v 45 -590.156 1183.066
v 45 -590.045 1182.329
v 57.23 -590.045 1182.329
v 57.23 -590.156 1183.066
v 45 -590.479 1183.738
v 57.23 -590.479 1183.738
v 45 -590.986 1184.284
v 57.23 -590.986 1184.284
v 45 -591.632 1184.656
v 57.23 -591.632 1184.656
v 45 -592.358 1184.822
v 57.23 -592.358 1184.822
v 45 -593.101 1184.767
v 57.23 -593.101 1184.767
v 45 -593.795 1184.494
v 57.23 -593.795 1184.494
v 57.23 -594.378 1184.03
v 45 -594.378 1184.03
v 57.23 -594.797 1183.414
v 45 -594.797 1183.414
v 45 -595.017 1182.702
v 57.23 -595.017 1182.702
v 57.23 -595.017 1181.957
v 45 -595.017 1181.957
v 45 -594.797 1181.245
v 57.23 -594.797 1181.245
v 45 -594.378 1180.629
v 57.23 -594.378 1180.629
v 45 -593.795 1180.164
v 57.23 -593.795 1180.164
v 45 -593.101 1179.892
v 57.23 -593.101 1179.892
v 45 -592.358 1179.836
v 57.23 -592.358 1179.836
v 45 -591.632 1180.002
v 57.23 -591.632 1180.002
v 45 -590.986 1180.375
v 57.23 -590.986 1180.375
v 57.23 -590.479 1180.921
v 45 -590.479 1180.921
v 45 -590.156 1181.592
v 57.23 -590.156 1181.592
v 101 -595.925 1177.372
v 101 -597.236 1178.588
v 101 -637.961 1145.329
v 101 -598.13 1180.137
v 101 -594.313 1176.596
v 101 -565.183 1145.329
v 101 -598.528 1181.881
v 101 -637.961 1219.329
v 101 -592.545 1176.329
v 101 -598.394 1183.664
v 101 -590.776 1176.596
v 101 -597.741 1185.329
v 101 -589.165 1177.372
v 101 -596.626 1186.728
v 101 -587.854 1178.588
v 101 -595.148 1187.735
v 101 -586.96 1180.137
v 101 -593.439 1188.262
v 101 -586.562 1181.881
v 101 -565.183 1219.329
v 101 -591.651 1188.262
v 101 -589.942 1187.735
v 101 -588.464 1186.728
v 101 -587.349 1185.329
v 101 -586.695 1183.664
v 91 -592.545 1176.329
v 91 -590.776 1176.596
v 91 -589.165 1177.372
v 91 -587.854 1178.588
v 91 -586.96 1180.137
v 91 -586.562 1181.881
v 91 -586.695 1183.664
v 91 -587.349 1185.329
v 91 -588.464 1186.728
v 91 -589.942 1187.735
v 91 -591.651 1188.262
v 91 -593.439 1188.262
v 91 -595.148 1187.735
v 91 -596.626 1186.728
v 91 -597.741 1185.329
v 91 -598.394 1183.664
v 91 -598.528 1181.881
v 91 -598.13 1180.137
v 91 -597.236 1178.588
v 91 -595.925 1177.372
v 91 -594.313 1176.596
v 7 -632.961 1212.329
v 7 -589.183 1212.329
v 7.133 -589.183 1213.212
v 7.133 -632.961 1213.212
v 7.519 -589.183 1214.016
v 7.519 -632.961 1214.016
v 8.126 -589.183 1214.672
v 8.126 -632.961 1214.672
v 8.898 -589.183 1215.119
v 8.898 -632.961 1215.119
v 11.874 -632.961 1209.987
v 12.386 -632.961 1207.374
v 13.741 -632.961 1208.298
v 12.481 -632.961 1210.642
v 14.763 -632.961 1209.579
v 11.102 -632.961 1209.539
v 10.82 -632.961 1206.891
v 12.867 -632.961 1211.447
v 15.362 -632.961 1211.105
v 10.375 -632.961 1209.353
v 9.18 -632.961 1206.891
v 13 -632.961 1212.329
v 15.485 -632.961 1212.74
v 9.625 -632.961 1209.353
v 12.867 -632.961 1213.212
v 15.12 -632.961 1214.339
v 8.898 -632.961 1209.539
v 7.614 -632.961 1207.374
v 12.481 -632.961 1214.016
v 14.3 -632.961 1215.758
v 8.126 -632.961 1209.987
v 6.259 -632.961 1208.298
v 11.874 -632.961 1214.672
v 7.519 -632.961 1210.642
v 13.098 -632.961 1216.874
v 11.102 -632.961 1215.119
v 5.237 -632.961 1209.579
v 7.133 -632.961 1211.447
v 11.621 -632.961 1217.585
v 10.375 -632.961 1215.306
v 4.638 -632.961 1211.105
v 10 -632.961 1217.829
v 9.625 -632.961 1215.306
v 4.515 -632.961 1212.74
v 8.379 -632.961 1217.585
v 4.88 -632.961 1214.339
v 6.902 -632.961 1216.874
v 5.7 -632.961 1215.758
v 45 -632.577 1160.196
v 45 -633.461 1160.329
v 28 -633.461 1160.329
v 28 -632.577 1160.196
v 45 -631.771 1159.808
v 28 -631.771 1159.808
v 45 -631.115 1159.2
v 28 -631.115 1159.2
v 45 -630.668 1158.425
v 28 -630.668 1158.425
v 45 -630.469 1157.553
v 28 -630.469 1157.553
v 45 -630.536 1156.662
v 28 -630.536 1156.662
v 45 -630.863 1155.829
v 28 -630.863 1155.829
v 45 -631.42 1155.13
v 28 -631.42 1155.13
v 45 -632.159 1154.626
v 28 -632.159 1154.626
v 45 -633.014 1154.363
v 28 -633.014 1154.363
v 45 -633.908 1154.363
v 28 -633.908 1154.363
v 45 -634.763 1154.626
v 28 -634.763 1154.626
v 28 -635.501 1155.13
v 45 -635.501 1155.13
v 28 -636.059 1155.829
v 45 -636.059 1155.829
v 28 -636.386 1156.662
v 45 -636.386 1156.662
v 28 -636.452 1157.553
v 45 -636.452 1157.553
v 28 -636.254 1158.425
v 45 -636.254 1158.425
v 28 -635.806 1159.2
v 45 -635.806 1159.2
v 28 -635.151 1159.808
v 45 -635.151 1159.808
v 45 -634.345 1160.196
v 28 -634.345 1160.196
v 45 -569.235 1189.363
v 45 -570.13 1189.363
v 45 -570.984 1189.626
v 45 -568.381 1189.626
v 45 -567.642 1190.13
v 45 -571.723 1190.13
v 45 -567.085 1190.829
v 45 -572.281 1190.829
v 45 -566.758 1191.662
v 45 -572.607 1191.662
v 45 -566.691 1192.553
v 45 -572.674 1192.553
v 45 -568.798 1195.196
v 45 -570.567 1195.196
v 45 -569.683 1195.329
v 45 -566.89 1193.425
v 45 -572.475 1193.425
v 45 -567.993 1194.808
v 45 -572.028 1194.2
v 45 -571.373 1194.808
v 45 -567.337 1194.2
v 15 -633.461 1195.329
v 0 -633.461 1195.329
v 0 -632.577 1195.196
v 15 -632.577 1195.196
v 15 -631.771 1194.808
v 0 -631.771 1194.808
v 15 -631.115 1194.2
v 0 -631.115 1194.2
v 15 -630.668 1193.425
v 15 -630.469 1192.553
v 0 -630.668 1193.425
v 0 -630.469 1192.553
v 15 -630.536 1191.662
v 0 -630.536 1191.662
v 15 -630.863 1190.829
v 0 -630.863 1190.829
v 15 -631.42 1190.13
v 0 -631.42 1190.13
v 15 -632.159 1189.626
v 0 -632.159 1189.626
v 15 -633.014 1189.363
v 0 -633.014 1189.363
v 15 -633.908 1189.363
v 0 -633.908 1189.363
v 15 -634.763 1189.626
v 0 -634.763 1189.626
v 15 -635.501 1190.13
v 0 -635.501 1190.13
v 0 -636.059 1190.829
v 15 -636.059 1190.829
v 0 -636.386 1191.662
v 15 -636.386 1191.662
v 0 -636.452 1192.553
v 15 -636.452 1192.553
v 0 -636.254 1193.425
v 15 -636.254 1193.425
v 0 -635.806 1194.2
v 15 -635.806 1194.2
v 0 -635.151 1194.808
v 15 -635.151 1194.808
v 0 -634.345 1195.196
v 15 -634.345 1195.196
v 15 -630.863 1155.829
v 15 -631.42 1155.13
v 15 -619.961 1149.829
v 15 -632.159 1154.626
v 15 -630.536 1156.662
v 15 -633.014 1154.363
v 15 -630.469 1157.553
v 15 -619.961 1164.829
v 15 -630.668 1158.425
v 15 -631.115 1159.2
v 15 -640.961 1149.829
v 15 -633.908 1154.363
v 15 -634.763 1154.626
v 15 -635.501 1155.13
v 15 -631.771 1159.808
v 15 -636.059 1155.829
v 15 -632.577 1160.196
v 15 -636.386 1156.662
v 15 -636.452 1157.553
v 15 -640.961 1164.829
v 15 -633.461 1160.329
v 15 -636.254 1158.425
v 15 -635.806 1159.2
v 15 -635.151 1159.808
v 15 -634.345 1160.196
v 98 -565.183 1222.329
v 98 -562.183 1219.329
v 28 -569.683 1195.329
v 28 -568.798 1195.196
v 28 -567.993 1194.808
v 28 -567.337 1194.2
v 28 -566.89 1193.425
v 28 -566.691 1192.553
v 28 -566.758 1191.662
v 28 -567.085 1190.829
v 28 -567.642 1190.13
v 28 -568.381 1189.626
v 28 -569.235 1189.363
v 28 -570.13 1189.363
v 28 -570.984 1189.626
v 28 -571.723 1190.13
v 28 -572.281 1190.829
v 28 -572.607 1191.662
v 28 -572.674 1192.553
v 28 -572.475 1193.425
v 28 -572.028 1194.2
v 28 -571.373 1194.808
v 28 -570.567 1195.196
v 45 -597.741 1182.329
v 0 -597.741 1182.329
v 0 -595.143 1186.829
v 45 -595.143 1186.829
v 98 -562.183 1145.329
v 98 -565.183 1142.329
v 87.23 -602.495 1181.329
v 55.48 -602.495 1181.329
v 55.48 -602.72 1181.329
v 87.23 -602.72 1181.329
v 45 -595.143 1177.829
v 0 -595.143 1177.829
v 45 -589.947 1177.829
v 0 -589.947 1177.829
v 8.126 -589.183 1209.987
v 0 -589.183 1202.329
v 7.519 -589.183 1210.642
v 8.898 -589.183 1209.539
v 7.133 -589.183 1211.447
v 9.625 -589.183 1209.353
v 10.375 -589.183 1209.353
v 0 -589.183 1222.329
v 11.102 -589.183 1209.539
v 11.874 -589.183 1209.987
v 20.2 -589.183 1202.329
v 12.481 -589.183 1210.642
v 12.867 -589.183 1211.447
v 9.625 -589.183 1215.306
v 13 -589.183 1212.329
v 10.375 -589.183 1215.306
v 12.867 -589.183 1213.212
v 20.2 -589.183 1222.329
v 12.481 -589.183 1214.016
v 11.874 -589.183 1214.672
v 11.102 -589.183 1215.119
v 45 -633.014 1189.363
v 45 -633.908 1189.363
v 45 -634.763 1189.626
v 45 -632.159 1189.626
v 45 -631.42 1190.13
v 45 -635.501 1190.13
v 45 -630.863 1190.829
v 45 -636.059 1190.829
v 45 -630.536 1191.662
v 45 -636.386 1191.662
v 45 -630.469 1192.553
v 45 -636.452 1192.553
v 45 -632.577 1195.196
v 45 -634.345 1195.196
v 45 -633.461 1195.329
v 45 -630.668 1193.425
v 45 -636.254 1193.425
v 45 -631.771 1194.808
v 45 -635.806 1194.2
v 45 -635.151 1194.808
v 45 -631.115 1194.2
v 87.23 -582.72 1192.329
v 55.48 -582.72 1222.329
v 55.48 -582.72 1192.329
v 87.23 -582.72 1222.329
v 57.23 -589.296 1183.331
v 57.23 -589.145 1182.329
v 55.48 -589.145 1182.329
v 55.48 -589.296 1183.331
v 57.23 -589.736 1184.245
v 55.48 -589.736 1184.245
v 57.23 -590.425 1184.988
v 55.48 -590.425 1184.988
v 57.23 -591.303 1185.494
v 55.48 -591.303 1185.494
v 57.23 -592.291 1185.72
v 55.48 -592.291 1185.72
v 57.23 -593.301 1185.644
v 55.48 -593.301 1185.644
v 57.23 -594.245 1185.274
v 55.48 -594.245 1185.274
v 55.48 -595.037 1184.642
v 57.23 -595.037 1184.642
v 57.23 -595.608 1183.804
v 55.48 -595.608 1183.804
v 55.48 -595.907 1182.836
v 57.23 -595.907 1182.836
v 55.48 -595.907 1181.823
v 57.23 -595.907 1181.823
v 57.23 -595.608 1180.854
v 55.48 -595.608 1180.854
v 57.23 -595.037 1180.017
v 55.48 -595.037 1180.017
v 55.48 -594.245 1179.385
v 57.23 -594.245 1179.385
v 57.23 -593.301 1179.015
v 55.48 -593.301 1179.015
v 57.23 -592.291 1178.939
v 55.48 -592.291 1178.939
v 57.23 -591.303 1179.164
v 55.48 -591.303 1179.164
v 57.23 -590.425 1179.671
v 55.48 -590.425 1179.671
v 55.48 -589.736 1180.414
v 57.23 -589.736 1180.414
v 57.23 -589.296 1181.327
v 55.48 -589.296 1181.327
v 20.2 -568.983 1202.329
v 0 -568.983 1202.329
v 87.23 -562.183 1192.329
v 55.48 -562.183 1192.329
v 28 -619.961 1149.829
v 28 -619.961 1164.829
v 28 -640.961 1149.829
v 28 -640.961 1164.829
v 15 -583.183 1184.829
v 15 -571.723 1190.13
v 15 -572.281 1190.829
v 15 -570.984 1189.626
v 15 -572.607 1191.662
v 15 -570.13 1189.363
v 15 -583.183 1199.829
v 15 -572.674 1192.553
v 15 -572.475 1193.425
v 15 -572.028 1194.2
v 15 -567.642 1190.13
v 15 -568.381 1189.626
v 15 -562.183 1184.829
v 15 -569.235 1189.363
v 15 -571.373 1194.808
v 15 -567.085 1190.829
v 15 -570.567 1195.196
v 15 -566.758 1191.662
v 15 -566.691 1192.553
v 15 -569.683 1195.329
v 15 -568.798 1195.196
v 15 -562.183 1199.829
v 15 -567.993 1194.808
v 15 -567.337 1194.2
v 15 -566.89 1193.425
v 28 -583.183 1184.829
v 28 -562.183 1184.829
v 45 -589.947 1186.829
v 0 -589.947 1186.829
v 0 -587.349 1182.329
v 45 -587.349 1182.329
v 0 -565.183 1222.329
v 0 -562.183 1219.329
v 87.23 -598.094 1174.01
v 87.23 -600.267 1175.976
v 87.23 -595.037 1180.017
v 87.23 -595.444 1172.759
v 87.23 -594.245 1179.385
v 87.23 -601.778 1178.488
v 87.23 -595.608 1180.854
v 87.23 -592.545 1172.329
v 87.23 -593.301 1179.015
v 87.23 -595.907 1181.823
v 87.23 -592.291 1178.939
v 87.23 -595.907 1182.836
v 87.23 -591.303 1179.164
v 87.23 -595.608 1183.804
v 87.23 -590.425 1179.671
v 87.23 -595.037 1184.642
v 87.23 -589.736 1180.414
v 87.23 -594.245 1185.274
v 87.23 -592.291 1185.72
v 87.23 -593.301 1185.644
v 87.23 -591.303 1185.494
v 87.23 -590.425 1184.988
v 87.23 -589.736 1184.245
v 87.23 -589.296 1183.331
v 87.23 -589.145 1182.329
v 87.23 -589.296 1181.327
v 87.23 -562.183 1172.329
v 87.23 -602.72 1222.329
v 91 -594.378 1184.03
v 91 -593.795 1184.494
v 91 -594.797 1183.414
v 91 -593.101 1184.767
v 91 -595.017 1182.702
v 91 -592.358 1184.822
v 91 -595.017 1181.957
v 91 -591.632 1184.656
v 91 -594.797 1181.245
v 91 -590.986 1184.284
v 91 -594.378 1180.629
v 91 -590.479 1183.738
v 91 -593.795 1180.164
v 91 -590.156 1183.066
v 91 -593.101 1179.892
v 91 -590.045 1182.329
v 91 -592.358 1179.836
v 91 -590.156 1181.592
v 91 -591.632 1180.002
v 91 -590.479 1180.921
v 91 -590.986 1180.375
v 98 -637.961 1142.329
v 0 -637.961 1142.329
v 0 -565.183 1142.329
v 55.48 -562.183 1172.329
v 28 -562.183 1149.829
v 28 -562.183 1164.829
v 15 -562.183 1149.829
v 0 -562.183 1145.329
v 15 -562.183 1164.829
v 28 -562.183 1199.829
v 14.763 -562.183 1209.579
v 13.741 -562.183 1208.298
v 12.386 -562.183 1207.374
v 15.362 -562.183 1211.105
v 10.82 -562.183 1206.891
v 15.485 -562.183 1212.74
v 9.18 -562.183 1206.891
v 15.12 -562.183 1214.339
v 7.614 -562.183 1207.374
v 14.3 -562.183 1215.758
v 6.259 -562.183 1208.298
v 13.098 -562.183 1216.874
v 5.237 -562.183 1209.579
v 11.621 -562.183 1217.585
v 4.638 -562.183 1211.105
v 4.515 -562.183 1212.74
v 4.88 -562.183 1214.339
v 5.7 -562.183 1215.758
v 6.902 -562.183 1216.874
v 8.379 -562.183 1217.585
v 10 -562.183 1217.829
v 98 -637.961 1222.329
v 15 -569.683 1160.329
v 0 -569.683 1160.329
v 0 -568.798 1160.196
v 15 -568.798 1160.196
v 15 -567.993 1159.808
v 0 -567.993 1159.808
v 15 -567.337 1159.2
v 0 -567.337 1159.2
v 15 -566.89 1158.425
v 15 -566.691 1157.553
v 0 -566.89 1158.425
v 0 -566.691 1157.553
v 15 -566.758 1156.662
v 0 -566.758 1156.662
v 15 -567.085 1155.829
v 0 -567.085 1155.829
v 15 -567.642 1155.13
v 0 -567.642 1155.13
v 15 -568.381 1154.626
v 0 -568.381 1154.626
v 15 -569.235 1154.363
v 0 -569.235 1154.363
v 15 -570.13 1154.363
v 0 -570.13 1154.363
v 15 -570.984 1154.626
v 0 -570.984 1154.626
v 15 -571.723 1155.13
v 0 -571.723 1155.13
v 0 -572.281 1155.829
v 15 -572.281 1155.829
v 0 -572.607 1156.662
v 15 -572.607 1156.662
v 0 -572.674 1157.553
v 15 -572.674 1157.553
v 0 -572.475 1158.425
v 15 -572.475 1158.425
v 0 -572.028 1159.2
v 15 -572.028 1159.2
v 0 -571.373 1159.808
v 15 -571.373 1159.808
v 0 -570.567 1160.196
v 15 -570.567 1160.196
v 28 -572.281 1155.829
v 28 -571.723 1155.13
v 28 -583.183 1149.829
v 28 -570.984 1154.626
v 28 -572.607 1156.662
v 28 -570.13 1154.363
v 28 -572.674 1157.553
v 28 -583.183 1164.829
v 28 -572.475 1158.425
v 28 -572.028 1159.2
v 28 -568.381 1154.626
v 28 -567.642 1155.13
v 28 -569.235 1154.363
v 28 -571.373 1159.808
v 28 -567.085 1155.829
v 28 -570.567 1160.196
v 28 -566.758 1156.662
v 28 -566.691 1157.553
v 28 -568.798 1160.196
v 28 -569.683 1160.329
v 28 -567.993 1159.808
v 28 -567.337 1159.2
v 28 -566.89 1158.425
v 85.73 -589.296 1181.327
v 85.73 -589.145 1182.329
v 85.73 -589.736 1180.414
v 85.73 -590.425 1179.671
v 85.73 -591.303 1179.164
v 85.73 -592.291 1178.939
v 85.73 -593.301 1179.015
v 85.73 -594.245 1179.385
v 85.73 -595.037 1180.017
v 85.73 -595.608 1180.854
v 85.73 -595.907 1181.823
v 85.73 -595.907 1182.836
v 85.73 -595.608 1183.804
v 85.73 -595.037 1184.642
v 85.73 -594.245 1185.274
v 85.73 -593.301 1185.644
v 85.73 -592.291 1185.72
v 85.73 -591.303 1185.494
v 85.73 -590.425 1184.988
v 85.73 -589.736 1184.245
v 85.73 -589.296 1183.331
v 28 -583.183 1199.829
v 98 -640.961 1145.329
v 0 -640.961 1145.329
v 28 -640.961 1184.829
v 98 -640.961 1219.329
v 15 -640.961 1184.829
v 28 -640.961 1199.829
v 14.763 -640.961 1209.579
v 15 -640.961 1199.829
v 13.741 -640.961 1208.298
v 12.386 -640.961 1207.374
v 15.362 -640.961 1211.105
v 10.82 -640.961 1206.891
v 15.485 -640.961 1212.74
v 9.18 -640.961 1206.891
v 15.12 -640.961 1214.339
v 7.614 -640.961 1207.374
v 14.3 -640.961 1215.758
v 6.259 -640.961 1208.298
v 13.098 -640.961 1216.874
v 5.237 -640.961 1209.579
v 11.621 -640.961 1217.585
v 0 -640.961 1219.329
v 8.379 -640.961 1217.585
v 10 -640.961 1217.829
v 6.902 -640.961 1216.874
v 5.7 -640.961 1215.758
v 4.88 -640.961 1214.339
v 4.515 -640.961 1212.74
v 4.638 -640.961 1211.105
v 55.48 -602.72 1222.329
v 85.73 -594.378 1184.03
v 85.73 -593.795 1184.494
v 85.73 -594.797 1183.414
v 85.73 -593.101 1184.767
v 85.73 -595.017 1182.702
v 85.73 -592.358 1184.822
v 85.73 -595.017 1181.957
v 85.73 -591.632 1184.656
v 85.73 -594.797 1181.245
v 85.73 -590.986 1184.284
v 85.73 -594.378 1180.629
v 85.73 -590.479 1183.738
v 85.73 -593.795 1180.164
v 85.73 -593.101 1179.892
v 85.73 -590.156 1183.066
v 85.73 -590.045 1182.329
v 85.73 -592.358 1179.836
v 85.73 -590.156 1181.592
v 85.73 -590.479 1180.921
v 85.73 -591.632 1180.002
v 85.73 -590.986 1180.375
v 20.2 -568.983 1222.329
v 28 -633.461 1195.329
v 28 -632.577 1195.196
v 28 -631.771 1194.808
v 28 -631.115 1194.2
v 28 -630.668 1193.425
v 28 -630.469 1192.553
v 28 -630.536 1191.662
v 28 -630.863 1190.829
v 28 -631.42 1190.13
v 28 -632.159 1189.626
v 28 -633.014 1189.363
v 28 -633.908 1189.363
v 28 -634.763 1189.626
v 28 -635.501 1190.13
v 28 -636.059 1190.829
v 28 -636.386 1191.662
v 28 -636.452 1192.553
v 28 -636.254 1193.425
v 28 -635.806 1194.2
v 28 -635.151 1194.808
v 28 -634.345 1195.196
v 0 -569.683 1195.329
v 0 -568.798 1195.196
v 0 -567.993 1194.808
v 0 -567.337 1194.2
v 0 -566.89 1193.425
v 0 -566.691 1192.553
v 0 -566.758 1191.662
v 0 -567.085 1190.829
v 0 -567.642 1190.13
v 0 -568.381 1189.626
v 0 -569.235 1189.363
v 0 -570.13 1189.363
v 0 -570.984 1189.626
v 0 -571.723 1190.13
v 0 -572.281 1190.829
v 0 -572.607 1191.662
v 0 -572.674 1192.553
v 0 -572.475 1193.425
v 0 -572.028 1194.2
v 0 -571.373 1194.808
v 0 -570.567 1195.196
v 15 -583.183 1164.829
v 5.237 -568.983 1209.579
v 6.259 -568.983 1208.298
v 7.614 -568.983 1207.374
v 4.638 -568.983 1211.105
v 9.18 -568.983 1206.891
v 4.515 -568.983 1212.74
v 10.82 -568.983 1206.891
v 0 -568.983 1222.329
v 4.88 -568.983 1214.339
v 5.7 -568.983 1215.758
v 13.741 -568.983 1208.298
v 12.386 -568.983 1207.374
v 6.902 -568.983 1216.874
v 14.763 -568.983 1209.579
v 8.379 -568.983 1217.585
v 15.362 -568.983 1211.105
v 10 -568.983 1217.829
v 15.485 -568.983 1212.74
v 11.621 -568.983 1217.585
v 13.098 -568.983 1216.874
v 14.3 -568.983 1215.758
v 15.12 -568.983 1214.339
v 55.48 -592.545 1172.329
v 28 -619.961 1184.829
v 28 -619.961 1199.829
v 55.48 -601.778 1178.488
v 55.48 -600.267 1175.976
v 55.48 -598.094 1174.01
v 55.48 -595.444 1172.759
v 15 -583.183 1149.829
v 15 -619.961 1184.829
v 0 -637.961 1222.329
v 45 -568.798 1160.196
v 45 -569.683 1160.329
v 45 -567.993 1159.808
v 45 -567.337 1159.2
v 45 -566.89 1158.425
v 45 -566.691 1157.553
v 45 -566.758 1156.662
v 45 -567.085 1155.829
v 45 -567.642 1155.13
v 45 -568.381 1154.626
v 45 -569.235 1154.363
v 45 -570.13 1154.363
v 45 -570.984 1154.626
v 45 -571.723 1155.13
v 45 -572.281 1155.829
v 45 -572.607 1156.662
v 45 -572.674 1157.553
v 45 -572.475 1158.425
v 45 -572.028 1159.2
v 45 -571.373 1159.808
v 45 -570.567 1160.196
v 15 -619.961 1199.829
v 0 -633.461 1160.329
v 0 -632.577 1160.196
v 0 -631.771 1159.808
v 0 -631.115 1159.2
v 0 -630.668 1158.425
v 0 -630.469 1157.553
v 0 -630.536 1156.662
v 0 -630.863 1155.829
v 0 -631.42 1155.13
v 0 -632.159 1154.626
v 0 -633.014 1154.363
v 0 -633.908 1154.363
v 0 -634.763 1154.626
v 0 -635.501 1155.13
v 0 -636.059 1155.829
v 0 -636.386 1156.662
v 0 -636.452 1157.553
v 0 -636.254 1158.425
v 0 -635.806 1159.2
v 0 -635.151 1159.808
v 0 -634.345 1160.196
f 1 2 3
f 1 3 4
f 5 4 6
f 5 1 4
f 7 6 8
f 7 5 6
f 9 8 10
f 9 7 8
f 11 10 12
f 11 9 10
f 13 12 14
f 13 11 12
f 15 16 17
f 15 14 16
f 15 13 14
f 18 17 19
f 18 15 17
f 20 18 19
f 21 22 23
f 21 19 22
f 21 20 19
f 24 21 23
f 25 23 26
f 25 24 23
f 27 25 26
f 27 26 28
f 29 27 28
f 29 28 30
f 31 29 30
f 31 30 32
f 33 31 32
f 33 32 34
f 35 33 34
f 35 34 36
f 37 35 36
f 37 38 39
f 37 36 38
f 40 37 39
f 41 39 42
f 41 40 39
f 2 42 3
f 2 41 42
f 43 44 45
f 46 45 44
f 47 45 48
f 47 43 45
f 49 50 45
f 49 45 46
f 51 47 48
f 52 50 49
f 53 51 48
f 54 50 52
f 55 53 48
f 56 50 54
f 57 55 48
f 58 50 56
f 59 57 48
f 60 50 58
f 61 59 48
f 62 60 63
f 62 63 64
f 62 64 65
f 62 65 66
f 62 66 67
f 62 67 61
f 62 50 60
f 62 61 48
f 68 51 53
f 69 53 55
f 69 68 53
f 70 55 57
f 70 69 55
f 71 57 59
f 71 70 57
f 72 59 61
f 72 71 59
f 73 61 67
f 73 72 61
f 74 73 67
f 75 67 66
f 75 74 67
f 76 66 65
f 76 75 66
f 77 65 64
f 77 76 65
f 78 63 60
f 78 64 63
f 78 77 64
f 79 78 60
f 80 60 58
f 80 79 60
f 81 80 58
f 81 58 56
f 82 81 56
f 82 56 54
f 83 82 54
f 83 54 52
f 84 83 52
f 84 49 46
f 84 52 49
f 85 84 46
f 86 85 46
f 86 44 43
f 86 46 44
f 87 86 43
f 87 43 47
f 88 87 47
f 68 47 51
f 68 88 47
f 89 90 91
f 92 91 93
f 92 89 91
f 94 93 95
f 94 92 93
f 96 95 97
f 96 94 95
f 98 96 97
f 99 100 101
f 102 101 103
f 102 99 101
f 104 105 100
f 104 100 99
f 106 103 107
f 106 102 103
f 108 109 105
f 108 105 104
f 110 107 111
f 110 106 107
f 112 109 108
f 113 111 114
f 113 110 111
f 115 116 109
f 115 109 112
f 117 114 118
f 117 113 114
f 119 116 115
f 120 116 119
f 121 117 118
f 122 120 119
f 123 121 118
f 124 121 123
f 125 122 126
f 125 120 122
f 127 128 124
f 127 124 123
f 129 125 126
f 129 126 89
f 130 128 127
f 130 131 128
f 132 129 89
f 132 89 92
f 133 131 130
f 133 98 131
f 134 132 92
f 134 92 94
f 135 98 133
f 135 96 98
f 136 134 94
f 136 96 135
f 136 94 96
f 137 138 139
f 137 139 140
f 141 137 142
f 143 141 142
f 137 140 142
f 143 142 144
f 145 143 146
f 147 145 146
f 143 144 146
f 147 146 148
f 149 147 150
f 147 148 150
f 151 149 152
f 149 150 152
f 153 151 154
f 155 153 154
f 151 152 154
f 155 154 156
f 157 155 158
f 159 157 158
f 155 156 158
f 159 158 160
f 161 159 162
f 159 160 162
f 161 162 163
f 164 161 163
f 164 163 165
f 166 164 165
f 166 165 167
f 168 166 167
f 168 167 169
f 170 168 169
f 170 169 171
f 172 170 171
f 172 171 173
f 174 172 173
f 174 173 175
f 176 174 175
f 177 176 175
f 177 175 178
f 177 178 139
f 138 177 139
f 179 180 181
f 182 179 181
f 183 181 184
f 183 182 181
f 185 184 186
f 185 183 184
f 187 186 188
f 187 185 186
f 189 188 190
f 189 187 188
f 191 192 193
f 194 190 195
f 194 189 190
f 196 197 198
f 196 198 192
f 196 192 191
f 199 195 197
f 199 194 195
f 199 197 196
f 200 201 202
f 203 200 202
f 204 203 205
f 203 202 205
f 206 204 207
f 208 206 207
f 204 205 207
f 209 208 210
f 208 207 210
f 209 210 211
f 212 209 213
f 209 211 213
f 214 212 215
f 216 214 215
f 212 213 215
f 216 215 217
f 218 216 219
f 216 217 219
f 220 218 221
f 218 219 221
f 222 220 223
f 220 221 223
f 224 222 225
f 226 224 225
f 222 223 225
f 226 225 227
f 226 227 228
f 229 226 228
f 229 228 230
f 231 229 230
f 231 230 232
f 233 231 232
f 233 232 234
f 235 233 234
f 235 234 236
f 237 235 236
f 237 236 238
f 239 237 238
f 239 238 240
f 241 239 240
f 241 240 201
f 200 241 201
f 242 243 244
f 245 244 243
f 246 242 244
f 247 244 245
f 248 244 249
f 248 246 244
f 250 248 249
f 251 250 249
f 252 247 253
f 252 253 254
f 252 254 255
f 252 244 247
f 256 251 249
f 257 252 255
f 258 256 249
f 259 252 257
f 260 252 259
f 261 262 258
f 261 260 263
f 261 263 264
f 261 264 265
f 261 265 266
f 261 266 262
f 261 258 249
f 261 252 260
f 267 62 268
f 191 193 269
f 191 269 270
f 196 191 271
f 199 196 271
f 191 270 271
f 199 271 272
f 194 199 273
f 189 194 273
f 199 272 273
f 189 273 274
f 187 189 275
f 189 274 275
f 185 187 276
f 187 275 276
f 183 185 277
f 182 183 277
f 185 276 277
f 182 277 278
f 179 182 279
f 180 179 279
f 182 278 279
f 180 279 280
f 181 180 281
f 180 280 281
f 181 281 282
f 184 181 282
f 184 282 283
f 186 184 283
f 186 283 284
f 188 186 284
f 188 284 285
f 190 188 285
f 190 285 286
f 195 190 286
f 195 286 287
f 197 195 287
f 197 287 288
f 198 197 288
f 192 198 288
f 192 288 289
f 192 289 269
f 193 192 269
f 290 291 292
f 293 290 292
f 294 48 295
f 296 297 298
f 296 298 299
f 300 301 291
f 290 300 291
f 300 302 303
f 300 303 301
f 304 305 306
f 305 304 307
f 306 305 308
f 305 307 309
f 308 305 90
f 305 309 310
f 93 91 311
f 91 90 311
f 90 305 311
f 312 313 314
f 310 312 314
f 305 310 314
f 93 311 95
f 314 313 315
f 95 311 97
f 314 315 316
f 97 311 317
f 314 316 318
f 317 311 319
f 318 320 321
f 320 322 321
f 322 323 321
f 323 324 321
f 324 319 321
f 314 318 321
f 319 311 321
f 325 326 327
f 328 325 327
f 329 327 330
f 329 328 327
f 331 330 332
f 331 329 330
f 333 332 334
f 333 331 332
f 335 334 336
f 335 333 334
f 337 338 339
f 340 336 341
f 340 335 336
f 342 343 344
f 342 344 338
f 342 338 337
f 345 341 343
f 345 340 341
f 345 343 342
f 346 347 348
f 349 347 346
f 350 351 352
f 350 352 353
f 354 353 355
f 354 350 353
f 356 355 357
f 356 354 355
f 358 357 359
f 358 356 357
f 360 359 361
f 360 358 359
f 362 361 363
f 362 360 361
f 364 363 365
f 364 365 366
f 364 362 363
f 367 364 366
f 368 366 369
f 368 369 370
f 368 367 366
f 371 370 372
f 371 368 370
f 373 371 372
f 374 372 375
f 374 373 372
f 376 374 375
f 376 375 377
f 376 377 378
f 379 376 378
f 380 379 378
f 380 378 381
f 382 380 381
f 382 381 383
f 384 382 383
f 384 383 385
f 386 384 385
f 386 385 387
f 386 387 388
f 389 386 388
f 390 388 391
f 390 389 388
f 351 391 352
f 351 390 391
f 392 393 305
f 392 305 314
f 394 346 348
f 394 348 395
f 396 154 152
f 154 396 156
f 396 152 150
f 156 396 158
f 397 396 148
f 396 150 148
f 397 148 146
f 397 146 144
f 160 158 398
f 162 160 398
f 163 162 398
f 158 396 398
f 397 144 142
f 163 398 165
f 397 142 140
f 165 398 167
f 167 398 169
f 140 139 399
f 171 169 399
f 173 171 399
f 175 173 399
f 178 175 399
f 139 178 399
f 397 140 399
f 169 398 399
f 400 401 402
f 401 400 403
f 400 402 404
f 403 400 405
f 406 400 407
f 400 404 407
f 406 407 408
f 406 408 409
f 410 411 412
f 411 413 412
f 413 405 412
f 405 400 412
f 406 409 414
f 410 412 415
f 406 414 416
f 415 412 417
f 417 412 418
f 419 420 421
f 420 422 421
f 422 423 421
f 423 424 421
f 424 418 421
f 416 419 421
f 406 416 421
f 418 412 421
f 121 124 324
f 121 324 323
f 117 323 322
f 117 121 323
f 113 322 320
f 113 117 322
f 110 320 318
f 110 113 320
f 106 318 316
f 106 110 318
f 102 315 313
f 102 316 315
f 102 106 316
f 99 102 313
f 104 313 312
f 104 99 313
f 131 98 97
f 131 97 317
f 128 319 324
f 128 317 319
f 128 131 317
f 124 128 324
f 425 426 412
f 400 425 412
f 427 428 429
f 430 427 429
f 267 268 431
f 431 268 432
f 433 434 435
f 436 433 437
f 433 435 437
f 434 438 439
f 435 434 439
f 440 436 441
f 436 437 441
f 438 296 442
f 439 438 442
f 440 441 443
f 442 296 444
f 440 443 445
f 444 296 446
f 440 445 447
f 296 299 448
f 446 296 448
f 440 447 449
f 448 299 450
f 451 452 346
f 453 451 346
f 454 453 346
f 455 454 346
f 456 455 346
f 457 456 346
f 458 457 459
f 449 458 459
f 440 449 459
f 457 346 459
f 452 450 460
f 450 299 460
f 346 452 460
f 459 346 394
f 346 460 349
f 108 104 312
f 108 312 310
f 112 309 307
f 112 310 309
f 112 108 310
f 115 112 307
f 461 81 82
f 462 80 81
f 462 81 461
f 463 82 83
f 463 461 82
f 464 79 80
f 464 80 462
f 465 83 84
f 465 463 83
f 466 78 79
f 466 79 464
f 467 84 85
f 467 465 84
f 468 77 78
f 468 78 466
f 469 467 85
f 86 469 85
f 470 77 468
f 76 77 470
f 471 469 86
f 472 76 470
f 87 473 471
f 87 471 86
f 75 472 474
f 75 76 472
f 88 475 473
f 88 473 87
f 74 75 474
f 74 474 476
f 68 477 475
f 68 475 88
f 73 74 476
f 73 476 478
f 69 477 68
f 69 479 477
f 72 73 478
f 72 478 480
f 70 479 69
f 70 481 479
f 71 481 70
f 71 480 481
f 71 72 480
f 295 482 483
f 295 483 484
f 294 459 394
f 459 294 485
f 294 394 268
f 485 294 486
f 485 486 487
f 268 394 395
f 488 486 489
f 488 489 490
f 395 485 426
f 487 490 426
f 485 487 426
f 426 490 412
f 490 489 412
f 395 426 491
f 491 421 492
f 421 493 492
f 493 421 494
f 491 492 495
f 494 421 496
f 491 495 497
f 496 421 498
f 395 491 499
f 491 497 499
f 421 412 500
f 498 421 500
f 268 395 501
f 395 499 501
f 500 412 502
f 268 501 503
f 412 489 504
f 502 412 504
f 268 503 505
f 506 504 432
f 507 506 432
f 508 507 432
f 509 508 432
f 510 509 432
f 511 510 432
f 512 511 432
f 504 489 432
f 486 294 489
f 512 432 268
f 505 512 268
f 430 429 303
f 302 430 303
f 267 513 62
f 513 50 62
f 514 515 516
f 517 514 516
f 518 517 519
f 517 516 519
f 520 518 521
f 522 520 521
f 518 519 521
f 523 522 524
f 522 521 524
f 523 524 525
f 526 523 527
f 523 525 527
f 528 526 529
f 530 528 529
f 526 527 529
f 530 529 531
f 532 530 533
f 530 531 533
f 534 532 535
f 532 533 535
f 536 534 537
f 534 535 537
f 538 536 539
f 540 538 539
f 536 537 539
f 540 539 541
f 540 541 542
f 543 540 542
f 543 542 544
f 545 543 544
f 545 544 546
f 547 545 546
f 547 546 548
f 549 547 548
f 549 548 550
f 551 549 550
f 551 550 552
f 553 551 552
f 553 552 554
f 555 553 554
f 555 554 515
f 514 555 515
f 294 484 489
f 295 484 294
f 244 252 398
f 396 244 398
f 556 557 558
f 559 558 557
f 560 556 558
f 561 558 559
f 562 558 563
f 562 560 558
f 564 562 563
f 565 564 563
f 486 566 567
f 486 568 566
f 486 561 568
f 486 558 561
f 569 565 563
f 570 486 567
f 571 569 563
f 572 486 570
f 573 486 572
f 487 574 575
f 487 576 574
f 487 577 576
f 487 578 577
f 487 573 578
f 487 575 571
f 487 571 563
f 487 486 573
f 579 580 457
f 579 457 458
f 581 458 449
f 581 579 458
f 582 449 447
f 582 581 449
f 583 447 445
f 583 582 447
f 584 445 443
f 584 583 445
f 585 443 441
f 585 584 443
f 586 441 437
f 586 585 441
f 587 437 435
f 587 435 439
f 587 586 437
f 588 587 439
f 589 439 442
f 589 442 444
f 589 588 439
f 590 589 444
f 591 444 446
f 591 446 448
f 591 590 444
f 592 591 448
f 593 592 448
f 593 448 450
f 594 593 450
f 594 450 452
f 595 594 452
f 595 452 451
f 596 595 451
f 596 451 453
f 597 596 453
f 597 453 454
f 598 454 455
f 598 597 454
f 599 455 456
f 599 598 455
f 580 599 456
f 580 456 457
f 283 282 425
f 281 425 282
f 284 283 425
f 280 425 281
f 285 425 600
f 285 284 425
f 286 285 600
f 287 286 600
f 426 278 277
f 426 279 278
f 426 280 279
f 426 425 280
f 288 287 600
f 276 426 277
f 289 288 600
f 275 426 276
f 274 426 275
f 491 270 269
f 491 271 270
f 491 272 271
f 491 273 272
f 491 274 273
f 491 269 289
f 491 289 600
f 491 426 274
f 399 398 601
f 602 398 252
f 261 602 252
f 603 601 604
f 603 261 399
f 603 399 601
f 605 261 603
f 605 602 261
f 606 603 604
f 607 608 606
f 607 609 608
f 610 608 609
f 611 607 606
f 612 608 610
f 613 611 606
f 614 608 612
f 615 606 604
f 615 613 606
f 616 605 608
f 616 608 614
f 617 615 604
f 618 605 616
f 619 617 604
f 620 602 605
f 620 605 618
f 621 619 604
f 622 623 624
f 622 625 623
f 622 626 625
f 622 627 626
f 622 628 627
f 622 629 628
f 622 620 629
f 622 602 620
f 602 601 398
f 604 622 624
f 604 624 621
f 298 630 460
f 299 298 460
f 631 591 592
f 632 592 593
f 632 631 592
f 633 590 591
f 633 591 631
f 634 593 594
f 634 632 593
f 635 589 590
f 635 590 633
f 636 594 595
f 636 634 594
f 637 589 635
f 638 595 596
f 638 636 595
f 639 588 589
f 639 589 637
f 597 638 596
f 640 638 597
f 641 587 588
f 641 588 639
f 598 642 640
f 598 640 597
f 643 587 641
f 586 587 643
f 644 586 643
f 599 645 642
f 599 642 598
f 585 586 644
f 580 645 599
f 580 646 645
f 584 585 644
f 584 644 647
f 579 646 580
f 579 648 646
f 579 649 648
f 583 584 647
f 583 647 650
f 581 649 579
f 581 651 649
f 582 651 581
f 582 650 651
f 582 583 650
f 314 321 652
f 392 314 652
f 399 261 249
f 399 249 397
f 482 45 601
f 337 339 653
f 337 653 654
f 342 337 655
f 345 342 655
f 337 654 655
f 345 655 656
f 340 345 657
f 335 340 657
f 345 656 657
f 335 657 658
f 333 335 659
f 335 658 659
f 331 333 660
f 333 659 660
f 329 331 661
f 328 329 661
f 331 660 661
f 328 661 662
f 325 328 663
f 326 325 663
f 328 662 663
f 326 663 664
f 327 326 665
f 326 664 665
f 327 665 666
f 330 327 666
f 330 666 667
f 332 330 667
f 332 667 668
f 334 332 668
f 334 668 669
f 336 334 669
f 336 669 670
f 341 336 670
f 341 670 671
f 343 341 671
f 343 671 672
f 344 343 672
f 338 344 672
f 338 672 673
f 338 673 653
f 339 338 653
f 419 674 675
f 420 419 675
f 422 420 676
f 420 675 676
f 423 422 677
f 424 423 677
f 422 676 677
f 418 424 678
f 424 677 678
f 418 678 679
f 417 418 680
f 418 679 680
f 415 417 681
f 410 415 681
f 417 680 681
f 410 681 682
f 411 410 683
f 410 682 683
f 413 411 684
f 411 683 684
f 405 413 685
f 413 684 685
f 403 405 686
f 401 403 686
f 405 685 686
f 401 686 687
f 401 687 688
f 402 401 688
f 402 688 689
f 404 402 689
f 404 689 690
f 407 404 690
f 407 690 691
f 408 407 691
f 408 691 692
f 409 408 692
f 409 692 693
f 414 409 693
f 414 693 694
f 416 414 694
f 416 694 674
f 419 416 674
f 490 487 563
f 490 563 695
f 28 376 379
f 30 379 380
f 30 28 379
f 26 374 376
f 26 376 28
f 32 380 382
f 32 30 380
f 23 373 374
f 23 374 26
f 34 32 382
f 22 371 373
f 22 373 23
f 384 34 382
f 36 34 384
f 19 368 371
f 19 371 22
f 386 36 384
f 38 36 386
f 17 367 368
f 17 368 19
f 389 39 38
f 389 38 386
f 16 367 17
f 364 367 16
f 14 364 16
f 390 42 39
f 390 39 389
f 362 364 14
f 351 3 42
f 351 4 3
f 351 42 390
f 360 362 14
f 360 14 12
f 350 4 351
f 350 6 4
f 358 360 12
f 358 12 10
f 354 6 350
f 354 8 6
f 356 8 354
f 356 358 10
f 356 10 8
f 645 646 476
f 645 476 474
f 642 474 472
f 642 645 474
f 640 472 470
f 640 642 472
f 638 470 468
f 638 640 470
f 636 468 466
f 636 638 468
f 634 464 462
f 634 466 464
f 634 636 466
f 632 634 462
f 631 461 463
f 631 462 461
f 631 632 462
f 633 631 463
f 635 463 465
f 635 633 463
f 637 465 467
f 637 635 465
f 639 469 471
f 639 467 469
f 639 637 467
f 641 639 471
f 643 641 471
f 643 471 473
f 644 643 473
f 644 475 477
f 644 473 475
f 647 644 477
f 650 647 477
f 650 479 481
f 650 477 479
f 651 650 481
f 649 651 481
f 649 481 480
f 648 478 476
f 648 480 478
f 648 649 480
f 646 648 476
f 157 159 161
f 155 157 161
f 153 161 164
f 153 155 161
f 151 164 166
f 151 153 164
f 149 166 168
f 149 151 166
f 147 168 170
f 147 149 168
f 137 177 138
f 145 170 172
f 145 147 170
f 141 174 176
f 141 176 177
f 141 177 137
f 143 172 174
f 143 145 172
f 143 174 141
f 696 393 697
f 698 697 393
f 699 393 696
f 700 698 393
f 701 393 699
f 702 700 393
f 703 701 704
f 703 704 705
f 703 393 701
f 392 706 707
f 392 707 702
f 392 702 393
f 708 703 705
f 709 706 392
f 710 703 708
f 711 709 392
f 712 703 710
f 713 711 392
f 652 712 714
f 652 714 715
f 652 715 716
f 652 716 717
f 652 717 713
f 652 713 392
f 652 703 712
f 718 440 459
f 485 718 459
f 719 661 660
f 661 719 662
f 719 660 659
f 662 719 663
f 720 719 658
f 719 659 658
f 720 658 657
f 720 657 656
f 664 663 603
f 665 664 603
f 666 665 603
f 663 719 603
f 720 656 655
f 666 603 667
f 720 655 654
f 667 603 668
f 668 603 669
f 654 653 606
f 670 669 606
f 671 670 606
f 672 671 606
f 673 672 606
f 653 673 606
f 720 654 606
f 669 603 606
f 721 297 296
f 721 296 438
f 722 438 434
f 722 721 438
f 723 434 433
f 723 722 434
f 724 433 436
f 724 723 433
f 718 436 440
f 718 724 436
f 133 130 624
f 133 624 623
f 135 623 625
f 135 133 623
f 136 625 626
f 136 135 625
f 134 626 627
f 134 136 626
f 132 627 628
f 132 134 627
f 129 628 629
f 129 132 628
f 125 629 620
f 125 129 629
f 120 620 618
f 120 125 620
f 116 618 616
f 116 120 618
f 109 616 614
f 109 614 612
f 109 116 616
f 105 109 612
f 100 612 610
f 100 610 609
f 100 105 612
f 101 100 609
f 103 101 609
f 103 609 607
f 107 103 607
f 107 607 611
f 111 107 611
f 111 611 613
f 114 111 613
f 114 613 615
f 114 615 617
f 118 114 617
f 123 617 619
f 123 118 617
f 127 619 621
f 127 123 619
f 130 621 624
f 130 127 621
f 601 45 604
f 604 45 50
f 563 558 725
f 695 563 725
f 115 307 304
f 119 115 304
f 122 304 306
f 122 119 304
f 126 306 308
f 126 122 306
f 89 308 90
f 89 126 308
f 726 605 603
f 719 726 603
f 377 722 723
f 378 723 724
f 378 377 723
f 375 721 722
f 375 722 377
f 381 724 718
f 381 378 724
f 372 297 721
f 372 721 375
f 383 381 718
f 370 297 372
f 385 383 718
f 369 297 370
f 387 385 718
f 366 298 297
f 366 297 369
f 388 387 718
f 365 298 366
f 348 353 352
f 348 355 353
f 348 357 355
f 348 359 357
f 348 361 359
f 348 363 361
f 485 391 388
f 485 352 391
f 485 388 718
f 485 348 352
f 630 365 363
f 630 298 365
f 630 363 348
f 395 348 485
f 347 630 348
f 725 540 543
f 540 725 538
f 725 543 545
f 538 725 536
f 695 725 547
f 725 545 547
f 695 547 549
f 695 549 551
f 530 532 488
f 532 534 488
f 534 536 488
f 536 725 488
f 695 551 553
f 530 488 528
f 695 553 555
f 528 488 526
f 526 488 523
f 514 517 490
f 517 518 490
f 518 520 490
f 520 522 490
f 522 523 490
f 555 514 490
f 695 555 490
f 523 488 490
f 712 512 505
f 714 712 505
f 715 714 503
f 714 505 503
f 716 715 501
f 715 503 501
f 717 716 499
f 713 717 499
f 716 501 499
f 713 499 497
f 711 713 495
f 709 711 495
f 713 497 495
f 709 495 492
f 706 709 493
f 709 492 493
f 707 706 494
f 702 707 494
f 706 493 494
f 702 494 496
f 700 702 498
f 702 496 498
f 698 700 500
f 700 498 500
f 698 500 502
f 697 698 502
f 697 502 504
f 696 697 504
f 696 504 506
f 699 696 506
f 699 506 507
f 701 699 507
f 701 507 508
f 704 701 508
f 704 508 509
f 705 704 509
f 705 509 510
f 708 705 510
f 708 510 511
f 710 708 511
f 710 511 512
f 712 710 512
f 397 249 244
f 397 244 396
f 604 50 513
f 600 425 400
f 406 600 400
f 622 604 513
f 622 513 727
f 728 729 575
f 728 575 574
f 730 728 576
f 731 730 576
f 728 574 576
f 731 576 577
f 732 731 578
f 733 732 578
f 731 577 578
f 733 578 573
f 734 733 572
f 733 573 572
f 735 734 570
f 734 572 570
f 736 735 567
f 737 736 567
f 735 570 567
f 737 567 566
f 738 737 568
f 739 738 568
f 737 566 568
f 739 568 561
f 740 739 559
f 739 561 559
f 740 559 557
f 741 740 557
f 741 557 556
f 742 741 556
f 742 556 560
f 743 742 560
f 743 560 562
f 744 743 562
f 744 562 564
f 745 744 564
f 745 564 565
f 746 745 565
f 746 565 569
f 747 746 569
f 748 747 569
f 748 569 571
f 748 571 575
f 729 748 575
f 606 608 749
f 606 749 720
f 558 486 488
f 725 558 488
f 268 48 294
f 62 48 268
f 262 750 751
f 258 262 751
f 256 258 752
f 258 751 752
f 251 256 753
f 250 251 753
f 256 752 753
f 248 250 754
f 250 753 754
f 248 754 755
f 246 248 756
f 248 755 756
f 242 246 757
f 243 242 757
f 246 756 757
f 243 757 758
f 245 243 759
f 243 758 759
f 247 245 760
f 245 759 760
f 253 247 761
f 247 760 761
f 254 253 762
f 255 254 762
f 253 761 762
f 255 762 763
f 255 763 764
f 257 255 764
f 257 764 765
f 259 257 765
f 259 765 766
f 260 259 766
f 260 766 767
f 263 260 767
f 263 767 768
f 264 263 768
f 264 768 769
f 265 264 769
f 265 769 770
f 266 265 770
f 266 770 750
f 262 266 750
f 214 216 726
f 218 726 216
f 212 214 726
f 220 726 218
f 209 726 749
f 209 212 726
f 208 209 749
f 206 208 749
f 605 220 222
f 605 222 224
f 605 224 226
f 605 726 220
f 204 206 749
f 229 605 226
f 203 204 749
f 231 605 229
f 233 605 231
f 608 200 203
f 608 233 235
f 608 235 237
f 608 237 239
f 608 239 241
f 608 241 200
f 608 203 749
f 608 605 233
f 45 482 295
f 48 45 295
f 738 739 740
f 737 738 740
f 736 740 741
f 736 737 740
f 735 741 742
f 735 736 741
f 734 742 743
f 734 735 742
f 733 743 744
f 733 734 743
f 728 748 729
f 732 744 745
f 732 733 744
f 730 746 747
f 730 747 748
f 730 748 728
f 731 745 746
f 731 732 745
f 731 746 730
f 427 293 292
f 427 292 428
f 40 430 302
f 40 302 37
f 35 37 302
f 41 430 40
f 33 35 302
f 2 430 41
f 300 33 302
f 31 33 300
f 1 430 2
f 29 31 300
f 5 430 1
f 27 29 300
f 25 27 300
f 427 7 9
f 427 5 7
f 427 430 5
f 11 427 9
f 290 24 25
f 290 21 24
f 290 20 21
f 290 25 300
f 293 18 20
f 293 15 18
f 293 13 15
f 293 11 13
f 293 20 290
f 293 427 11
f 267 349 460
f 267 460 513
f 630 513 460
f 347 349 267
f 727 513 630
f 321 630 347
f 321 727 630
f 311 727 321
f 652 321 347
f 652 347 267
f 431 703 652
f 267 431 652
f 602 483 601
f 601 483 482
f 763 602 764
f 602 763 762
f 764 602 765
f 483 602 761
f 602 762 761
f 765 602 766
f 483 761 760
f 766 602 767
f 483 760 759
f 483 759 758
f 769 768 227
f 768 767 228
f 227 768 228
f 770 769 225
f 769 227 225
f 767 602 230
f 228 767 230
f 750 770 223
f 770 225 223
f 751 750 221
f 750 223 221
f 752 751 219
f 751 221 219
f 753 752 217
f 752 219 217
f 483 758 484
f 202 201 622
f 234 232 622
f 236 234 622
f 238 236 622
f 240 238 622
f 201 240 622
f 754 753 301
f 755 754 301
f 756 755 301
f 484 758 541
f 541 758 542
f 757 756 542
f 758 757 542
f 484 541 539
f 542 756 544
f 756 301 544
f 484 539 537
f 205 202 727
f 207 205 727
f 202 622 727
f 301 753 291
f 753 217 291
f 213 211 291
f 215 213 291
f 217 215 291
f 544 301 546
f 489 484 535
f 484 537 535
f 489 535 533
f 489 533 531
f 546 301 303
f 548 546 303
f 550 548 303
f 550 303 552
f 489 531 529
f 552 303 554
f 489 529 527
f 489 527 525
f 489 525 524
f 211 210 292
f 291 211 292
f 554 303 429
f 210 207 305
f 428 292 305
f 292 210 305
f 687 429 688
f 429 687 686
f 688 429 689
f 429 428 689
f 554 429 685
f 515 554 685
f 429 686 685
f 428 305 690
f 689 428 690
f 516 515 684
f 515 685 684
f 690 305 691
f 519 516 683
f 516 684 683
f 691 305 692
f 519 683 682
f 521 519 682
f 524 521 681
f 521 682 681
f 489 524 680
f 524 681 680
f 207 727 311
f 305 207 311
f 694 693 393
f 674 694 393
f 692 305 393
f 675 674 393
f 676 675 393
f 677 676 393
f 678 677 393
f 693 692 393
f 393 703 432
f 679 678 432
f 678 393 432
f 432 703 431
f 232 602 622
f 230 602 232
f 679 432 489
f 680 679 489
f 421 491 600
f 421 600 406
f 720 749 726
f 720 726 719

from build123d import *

# Parameters (mm, degrees)
SKETCH1_W               = 78.778264774
SKETCH1_H               = 80
BOSS_EXTRUDE1_DEPTH     = 45
SKETCH2_W               = 20.2
SKETCH2_H               = 20.2
CUT_EXTRUDE1_DEPTH      = 20
CUT_EXTRUDE2_DEPTH      = 1226.691607852
CUT_EXTRUDE2_DEPTH_BACK = 1226.691607852
SKETCH4_W               = 78.778264774
SKETCH4_H               = 80
BOSS_EXTRUDE2_DEPTH     = 56
CUT_EXTRUDE3_START      = -50.519806
SKETCH5_R               = 10
CUT_EXTRUDE3_DEPTH      = 50.519818
SKETCH6_R               = 3.4
BOSS_EXTRUDE3_DEPTH     = 12
SKETCH7_R               = 10
BOSS_EXTRUDE4_DEPTH     = 5
SKETCH8_R               = 3.4
BOSS_EXTRUDE5_DEPTH     = 1.5
SKETCH9_R               = 10
BOSS_EXTRUDE6_DEPTH     = 13.769806202
SKETCH10_W              = 31.75
SKETCH10_H              = 20
CUT_EXTRUDE4_DEPTH      = 41
SKETCH13_W              = 30.362291711
SKETCH13_H              = 20
CUT_EXTRUDE5_DEPTH      = 31.75
SKETCH11_R              = 3.4
BOSS_EXTRUDE7_DEPTH     = 14
SKETCH12_R              = 3.4
BOSS_EXTRUDE8_DEPTH     = 1.5
CUT_EXTRUDE6_DEPTH      = 1382.374333236
CUT_EXTRUDE6_DEPTH_BACK = 1382.374333236
SKETCH14_R              = 2.5
CUT_EXTRUDE7_DEPTH      = 1384.878879614
CUT_EXTRUDE7_DEPTH_BACK = 10
SKETCH15_R              = 6
CUT_EXTRUDE8_DEPTH      = 45
SKETCH17_R              = 3
CUT_EXTRUDE9_DEPTH      = 45
SKETCH18_W              = 13
SKETCH18_H              = 15
CUT_EXTRUDE10_DEPTH     = 21
SKETCH19_W              = 13
SKETCH19_H              = 15
CUT_EXTRUDE11_DEPTH     = 21
CHAMFER1_SIZE           = 3
SKETCH20_R              = 5.5
CUT_EXTRUDE12_DEPTH     = 8
CUT_EXTRUDE13_START     = -8
SKETCH21_R              = 5.5
CUT_EXTRUDE13_DEPTH     = 8


with BuildPart() as part:
    # Sketch1 → Boss-Extrude1 (new body)
    with BuildSketch(Plane.YZ):
        with Locations((-601.571748543, 1182.329293832)):
            Rectangle(SKETCH1_W, SKETCH1_H)
    extrude(amount=BOSS_EXTRUDE1_DEPTH)

    # Sketch2 → Cut-Extrude1 (cut)
    with BuildSketch(Plane.XY.offset(1222.329293832)):
        with Locations((10.1, -579.082515944)):
            Rectangle(SKETCH2_W, SKETCH2_H)
    extrude(amount=-CUT_EXTRUDE1_DEPTH, mode=Mode.SUBTRACT)

    # Sketch3 → Cut-Extrude2 (cut, two sides: drawn at the far end of the back side and taken through both)
    with BuildSketch(Plane(origin=(0, -562.182616156, 0), x_dir=(-1, 0, 0), z_dir=(0, 1, 0)).offset(-CUT_EXTRUDE2_DEPTH_BACK)):
        with BuildLine():
            ThreePointArc((-11.102244776, 1215.119465234), (-13, 1212.329293832), (-11.102244776, 1209.53912243))
            Line((-11.102244776, 1209.53912243), (-11.102244776, 1215.119465234))
        make_face()
        with BuildLine():
            Line((-11.102244776, 1215.119465234), (-11.102244776, 1209.53912243))
            ThreePointArc((-11.102244776, 1209.53912243), (-10, 1209.329293832), (-8.897755224, 1209.53912243))
            Line((-8.897755224, 1209.53912243), (-8.897755224, 1215.119465234))
            ThreePointArc((-8.897755224, 1215.119465234), (-10, 1215.329293832), (-11.102244776, 1215.119465234))
        make_face()
        with BuildLine():
            Line((-8.897755224, 1215.119465234), (-8.897755224, 1209.53912243))
            ThreePointArc((-8.897755224, 1209.53912243), (-7.519401853, 1210.642097093), (-7, 1212.329293832))
            ThreePointArc((-7, 1212.329293832), (-7.519401853, 1214.016490571), (-8.897755224, 1215.119465234))
        make_face()
    extrude(amount=CUT_EXTRUDE2_DEPTH + CUT_EXTRUDE2_DEPTH_BACK, mode=Mode.SUBTRACT)

    # Sketch4 → Boss-Extrude2 (add)
    with BuildSketch(Plane.YZ.offset(45)):
        with Locations((-601.571748543, 1182.329293832)):
            Rectangle(SKETCH4_W, SKETCH4_H)
    extrude(amount=BOSS_EXTRUDE2_DEPTH)

    # Sketch5 → Cut-Extrude3 (cut)
    with BuildSketch(Plane.YZ.offset(101).offset(CUT_EXTRUDE3_START)):
        with Locations(Location((-592.544907867, 1182.329293832, 0), (0, 0, 270))):
            Circle(SKETCH5_R)
    extrude(amount=CUT_EXTRUDE3_DEPTH, mode=Mode.SUBTRACT)

    # Sketch6 → Boss-Extrude3 (add)
    with BuildSketch(Plane(origin=(57.230193798, 0, 0), x_dir=(0, -1, 0), z_dir=(-1, 0, 0))):
        with Locations(Location((592.544907867, 1182.329293832, 0), (0, 0, 180))):
            Circle(SKETCH6_R)
    extrude(amount=BOSS_EXTRUDE3_DEPTH)

    # Sketch7 → Boss-Extrude4 (add)
    with BuildSketch(Plane.YZ.offset(50.480193798)):
        with Locations(Location((-592.544907867, 1182.329293832, 0), (0, 0, 270))):
            Circle(SKETCH7_R)
    extrude(amount=BOSS_EXTRUDE4_DEPTH)



with BuildPart() as body_2:
    # Sketch8 → Boss-Extrude5 (new body)
    with BuildSketch(Plane.YZ.offset(85.730193798)):
        with Locations((-592.544907867, 1182.329293832)):
            Circle(SKETCH8_R)
    extrude(amount=BOSS_EXTRUDE5_DEPTH)


with BuildPart() as part_1:
    add(part.part)

    add(body_2.part)  # Boss-Extrude6 merges body 2
    # Sketch9 → Boss-Extrude6 (add)
    with BuildSketch(Plane.YZ.offset(87.230193798)):
        with Locations((-592.544907867, 1182.329293832)):
            Circle(SKETCH9_R)
    extrude(amount=BOSS_EXTRUDE6_DEPTH)

    # Sketch10 → Cut-Extrude4 (cut)
    with BuildSketch(Plane.XY.offset(1222.329293832)):
        with Locations((71.355193798, -592.719907867)):
            Rectangle(SKETCH10_W, SKETCH10_H)
    extrude(amount=-CUT_EXTRUDE4_DEPTH, mode=Mode.SUBTRACT)

    # Sketch13 → Cut-Extrude5 (cut)
    with BuildSketch(Plane.YZ.offset(55.480193798)):
        with Locations((-577.363762012, 1182.329293832)):
            Rectangle(SKETCH13_W, SKETCH13_H)
    extrude(amount=CUT_EXTRUDE5_DEPTH, mode=Mode.SUBTRACT)

    # Sketch11 → Boss-Extrude7 (add)
    with BuildSketch(Plane.YZ.offset(57.230193798)):
        with Locations((-592.544907867, 1182.329293832)):
            Circle(SKETCH11_R)
    extrude(amount=-BOSS_EXTRUDE7_DEPTH)

    # Sketch12 → Boss-Extrude8 (add)
    with BuildSketch(Plane(origin=(85.730193798, 0, 0), x_dir=(0, -1, 0), z_dir=(-1, 0, 0))):
        with Locations(Location((592.544907867, 1182.329293832, 0), (0, 0, 180))):
            Circle(SKETCH12_R)
    extrude(amount=-BOSS_EXTRUDE8_DEPTH)

    # Sketch14 → Cut-Extrude6 (cut, two sides: drawn at the far end of the back side and taken through both)
    with BuildSketch(Plane.YZ.offset(57.230193798).offset(-CUT_EXTRUDE6_DEPTH_BACK)):
        with Locations((-592.544907867, 1182.329293832)):
            Circle(SKETCH14_R)
    extrude(amount=CUT_EXTRUDE6_DEPTH + CUT_EXTRUDE6_DEPTH_BACK, mode=Mode.SUBTRACT)

    # Sketch15 → Cut-Extrude7 (cut, two sides: drawn at the far end of the back side and taken through both)
    with BuildSketch(Plane.YZ.offset(101).offset(-CUT_EXTRUDE7_DEPTH_BACK)):
        with Locations(Location((-592.544907867, 1182.329293832, 0), (0, 0, 270))):
            Circle(SKETCH15_R)
    extrude(amount=CUT_EXTRUDE7_DEPTH + CUT_EXTRUDE7_DEPTH_BACK, mode=Mode.SUBTRACT)

    # Sketch16 → Cut-Extrude8 (cut)
    with BuildSketch(Plane(origin=(0, 0, 0), x_dir=(0, -1, 0), z_dir=(-1, 0, 0))):
        Polygon((589.946831656, 1177.829293832), (595.142984078, 1177.829293832), (597.74106029, 1182.329293832), (595.142984078, 1186.829293832), (589.946831656, 1186.829293832), (587.348755444, 1182.329293832), align=None)
    extrude(amount=-CUT_EXTRUDE8_DEPTH, mode=Mode.SUBTRACT)

    # Sketch17 → Cut-Extrude9 (cut)
    with BuildSketch(Plane(origin=(0, 0, 0), x_dir=(0, -1, 0), z_dir=(-1, 0, 0))):
        with Locations(Location((569.682616156, 1157.329293832, 0), (0, 0, 90))):
            Circle(SKETCH17_R)
        with Locations(Location((633.46088093, 1157.329293832, 0), (0, 0, 90))):
            Circle(SKETCH17_R)
        with Locations(Location((569.682616156, 1192.329293832, 0), (0, 0, 90))):
            Circle(SKETCH17_R)
        with Locations(Location((633.46088093, 1192.329293832, 0), (0, 0, 90))):
            Circle(SKETCH17_R)
    extrude(amount=-CUT_EXTRUDE9_DEPTH, mode=Mode.SUBTRACT)

    # Sketch18 → Cut-Extrude10 (cut)
    with BuildSketch(Plane(origin=(0, -562.182616156, 0), x_dir=(-1, 0, 0), z_dir=(0, 1, 0))):
        with Locations((-21.5, 1157.329293832)):
            Rectangle(SKETCH18_W, SKETCH18_H)
        with Locations((-21.5, 1192.329293832)):
            Rectangle(SKETCH18_W, SKETCH18_H)
    extrude(amount=-CUT_EXTRUDE10_DEPTH, mode=Mode.SUBTRACT)

    # Sketch19 → Cut-Extrude11 (cut)
    with BuildSketch(Plane.XZ.offset(640.96088093)):
        with Locations((21.5, 1157.329293832)):
            Rectangle(SKETCH19_W, SKETCH19_H)
        with Locations((21.5, 1192.329293832)):
            Rectangle(SKETCH19_W, SKETCH19_H)
    extrude(amount=-CUT_EXTRUDE11_DEPTH, mode=Mode.SUBTRACT)

    # Chamfer1
    chamfer1_edges = [part_1.edges().sort_by_distance(p)[0] for p in [
        (101, -601.571748543, 1222.329293832),
        (101, -640.96088093, 1182.329293832),
        (101, -601.571748543, 1142.329293832),
        (101, -562.182616156, 1182.329293832),
        (50.5, -640.96088093, 1222.329293832),
        (50.5, -562.182616156, 1222.329293832),
        (50.5, -562.182616156, 1142.329293832),
        (50.5, -640.96088093, 1142.329293832),
    ]]
    chamfer(chamfer1_edges, length=CHAMFER1_SIZE)

    # Sketch20 → Cut-Extrude12 (cut)
    with BuildSketch(Plane(origin=(0, -562.182616156, 0), x_dir=(-1, 0, 0), z_dir=(0, 1, 0))):
        with Locations(Location((-10, 1212.329293832, 0), (0, 0, 90))):
            Circle(SKETCH20_R)
    extrude(amount=-CUT_EXTRUDE12_DEPTH, mode=Mode.SUBTRACT)

    # Sketch21 → Cut-Extrude13 (cut)
    with BuildSketch(Plane.XZ.offset(640.96088093).offset(CUT_EXTRUDE13_START)):
        with Locations(Location((10, 1212.329293832, 0), (0, 0, 90))):
            Circle(SKETCH21_R)
    extrude(amount=CUT_EXTRUDE13_DEPTH, mode=Mode.SUBTRACT)


solid = part_1.part
